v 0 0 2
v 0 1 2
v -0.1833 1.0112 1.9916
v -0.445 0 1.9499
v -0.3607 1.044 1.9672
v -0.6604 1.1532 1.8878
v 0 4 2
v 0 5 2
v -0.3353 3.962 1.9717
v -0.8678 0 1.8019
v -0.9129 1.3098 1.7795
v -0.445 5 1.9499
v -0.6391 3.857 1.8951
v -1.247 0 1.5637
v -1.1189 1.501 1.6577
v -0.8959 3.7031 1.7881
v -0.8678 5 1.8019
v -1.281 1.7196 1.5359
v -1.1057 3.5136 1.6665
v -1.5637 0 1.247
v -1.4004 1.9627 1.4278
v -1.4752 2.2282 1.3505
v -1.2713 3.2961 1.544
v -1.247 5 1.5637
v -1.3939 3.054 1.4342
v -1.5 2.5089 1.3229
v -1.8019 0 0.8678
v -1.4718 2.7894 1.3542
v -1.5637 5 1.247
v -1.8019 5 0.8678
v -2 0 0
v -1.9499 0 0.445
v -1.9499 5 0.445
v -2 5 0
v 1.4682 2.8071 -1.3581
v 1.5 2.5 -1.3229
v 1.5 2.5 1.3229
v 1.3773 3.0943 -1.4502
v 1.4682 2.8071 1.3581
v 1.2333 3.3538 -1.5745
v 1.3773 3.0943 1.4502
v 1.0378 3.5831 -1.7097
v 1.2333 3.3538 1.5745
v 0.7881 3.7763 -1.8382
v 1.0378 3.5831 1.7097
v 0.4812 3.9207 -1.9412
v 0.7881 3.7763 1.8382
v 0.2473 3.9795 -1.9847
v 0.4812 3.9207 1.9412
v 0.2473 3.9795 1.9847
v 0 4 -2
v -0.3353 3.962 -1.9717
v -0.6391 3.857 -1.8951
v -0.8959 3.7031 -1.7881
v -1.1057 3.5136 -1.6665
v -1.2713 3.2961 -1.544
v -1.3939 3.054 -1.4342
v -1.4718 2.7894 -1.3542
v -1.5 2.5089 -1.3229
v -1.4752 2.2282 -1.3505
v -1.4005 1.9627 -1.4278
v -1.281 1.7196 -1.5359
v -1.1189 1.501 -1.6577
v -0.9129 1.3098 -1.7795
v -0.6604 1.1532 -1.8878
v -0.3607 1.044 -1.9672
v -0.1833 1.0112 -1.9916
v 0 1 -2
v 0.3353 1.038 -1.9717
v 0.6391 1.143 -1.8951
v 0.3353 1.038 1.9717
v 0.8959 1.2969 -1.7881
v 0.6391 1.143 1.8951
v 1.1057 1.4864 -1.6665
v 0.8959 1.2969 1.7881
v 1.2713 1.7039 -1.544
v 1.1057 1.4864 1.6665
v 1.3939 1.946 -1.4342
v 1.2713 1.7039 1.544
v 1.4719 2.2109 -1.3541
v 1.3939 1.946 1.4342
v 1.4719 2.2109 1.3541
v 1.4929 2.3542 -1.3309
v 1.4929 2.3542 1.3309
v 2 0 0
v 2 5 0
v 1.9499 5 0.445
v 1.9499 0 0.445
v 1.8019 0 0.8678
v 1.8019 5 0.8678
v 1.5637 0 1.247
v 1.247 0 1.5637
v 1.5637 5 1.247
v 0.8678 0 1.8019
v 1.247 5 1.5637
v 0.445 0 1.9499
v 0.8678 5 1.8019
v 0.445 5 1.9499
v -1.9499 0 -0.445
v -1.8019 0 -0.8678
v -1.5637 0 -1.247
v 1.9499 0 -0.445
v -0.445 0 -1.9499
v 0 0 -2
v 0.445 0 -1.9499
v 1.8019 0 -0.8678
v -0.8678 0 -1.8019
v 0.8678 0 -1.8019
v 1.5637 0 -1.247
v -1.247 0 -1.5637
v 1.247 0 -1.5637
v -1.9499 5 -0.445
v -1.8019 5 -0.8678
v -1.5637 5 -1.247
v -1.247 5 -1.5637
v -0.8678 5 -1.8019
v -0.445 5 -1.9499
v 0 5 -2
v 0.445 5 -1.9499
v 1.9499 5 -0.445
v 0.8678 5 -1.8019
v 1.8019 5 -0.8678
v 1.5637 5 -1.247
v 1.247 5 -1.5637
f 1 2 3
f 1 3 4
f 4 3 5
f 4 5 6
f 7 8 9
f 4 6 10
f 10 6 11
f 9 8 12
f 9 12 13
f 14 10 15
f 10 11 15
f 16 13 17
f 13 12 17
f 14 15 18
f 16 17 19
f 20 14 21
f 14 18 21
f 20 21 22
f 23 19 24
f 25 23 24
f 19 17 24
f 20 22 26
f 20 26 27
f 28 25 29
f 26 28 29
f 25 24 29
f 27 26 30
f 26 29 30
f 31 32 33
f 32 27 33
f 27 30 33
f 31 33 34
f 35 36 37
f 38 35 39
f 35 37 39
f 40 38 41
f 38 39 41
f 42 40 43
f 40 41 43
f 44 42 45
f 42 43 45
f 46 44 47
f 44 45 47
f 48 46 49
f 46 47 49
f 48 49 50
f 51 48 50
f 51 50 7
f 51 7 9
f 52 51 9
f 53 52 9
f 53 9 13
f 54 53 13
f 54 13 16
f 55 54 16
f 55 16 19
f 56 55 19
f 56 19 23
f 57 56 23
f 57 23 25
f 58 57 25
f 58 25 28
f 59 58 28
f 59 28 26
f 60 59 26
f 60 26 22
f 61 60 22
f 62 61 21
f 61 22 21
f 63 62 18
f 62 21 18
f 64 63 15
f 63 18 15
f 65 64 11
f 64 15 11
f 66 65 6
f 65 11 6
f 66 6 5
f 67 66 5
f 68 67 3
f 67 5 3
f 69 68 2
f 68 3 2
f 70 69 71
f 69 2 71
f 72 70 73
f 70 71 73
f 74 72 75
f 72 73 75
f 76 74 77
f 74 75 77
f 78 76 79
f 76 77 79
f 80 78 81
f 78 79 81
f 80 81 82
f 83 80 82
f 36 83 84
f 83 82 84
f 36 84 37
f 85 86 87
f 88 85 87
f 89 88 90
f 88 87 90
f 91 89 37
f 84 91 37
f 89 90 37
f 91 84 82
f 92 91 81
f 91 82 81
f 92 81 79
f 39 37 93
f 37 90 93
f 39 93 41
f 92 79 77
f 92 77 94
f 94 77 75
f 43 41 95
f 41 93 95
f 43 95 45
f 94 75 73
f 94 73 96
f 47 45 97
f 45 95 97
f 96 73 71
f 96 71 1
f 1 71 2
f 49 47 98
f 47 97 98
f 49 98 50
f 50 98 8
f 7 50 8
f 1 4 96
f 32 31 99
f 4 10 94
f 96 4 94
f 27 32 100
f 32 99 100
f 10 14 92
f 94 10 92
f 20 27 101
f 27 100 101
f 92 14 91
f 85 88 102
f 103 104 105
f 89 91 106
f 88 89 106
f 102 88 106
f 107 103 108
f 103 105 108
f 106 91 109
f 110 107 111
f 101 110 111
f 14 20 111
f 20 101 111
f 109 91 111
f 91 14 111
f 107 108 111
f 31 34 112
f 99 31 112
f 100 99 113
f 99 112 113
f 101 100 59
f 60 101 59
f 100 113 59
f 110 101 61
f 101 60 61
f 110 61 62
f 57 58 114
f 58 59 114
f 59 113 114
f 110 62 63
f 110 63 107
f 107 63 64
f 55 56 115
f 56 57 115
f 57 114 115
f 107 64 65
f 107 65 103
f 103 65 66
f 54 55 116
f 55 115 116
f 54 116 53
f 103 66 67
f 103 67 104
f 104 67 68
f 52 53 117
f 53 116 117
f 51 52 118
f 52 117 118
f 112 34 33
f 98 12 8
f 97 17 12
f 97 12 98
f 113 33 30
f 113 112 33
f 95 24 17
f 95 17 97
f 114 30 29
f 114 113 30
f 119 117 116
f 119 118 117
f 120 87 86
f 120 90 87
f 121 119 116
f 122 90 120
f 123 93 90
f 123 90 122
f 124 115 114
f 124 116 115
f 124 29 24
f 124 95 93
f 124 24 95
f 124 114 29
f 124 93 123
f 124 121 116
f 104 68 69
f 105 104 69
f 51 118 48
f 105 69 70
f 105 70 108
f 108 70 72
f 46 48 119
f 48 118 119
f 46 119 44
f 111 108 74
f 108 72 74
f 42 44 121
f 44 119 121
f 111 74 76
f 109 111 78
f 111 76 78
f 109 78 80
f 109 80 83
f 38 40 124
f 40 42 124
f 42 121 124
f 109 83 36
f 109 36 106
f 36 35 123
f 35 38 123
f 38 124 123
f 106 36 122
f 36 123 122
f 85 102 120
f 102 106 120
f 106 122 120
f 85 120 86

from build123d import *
from build123d.topology import SkipClean

# Parameters (mm, degrees)
SKETCH_1_W           = 4
SKETCH_1_H           = 4
EXTRUDE_2_DEPTH      = 5
SKETCH_3_R           = 1.5
CUT_EXTRUDE_2_DEPTH  = 7.708203932
CUT_EXTRUDE_14_DEPTH = 6.744562647


with BuildPart() as part:
    # 草图1 → 凸台-拉伸2 (new body)
    with BuildSketch(Plane(origin=(0, 0, 0), x_dir=(1, 0, 0), z_dir=(0, 1, 0))):
        Rectangle(SKETCH_1_W, SKETCH_1_H)
    extrude(amount=EXTRUDE_2_DEPTH)

    # 草图3 → 切除-拉伸2 (cut, through all)
    with BuildSketch(Plane.XY.offset(2)):
        with Locations((0, 2.5)):
            Circle(SKETCH_3_R)
    extrude(amount=-CUT_EXTRUDE_2_DEPTH, mode=Mode.SUBTRACT)

    # 草图6 → 切除-拉伸14 (cut, through all)
    with SkipClean():  # the faces are left unmerged after this step: merging them gives an invalid solid
        with BuildSketch(Plane(origin=(0, 5, 0), x_dir=(1, 0, 0), z_dir=(0, 1, 0))):
            with BuildLine():
                Line((-2, 2), (-2, 0))
                ThreePointArc((-2, 0), (-1.414213562, 1.414213562), (0, 2))
                Line((0, 2), (-2, 2))
            make_face()
            with BuildLine():
                ThreePointArc((0, 2), (1.414213562, 1.414213562), (2, 0))
                Line((2, 0), (2, 2))
                Line((2, 2), (0, 2))
            make_face()
            with BuildLine():
                Line((0, -2), (2, -2))
                Line((2, -2), (2, 0))
                ThreePointArc((2, 0), (1.414213562, -1.414213562), (0, -2))
            make_face()
            with BuildLine():
                Line((-2, -2), (0, -2))
                ThreePointArc((0, -2), (-1.414213562, -1.414213562), (-2, 0))
                Line((-2, 0), (-2, -2))
            make_face()
        extrude(amount=-CUT_EXTRUDE_14_DEPTH, mode=Mode.SUBTRACT)


solid = part.part
